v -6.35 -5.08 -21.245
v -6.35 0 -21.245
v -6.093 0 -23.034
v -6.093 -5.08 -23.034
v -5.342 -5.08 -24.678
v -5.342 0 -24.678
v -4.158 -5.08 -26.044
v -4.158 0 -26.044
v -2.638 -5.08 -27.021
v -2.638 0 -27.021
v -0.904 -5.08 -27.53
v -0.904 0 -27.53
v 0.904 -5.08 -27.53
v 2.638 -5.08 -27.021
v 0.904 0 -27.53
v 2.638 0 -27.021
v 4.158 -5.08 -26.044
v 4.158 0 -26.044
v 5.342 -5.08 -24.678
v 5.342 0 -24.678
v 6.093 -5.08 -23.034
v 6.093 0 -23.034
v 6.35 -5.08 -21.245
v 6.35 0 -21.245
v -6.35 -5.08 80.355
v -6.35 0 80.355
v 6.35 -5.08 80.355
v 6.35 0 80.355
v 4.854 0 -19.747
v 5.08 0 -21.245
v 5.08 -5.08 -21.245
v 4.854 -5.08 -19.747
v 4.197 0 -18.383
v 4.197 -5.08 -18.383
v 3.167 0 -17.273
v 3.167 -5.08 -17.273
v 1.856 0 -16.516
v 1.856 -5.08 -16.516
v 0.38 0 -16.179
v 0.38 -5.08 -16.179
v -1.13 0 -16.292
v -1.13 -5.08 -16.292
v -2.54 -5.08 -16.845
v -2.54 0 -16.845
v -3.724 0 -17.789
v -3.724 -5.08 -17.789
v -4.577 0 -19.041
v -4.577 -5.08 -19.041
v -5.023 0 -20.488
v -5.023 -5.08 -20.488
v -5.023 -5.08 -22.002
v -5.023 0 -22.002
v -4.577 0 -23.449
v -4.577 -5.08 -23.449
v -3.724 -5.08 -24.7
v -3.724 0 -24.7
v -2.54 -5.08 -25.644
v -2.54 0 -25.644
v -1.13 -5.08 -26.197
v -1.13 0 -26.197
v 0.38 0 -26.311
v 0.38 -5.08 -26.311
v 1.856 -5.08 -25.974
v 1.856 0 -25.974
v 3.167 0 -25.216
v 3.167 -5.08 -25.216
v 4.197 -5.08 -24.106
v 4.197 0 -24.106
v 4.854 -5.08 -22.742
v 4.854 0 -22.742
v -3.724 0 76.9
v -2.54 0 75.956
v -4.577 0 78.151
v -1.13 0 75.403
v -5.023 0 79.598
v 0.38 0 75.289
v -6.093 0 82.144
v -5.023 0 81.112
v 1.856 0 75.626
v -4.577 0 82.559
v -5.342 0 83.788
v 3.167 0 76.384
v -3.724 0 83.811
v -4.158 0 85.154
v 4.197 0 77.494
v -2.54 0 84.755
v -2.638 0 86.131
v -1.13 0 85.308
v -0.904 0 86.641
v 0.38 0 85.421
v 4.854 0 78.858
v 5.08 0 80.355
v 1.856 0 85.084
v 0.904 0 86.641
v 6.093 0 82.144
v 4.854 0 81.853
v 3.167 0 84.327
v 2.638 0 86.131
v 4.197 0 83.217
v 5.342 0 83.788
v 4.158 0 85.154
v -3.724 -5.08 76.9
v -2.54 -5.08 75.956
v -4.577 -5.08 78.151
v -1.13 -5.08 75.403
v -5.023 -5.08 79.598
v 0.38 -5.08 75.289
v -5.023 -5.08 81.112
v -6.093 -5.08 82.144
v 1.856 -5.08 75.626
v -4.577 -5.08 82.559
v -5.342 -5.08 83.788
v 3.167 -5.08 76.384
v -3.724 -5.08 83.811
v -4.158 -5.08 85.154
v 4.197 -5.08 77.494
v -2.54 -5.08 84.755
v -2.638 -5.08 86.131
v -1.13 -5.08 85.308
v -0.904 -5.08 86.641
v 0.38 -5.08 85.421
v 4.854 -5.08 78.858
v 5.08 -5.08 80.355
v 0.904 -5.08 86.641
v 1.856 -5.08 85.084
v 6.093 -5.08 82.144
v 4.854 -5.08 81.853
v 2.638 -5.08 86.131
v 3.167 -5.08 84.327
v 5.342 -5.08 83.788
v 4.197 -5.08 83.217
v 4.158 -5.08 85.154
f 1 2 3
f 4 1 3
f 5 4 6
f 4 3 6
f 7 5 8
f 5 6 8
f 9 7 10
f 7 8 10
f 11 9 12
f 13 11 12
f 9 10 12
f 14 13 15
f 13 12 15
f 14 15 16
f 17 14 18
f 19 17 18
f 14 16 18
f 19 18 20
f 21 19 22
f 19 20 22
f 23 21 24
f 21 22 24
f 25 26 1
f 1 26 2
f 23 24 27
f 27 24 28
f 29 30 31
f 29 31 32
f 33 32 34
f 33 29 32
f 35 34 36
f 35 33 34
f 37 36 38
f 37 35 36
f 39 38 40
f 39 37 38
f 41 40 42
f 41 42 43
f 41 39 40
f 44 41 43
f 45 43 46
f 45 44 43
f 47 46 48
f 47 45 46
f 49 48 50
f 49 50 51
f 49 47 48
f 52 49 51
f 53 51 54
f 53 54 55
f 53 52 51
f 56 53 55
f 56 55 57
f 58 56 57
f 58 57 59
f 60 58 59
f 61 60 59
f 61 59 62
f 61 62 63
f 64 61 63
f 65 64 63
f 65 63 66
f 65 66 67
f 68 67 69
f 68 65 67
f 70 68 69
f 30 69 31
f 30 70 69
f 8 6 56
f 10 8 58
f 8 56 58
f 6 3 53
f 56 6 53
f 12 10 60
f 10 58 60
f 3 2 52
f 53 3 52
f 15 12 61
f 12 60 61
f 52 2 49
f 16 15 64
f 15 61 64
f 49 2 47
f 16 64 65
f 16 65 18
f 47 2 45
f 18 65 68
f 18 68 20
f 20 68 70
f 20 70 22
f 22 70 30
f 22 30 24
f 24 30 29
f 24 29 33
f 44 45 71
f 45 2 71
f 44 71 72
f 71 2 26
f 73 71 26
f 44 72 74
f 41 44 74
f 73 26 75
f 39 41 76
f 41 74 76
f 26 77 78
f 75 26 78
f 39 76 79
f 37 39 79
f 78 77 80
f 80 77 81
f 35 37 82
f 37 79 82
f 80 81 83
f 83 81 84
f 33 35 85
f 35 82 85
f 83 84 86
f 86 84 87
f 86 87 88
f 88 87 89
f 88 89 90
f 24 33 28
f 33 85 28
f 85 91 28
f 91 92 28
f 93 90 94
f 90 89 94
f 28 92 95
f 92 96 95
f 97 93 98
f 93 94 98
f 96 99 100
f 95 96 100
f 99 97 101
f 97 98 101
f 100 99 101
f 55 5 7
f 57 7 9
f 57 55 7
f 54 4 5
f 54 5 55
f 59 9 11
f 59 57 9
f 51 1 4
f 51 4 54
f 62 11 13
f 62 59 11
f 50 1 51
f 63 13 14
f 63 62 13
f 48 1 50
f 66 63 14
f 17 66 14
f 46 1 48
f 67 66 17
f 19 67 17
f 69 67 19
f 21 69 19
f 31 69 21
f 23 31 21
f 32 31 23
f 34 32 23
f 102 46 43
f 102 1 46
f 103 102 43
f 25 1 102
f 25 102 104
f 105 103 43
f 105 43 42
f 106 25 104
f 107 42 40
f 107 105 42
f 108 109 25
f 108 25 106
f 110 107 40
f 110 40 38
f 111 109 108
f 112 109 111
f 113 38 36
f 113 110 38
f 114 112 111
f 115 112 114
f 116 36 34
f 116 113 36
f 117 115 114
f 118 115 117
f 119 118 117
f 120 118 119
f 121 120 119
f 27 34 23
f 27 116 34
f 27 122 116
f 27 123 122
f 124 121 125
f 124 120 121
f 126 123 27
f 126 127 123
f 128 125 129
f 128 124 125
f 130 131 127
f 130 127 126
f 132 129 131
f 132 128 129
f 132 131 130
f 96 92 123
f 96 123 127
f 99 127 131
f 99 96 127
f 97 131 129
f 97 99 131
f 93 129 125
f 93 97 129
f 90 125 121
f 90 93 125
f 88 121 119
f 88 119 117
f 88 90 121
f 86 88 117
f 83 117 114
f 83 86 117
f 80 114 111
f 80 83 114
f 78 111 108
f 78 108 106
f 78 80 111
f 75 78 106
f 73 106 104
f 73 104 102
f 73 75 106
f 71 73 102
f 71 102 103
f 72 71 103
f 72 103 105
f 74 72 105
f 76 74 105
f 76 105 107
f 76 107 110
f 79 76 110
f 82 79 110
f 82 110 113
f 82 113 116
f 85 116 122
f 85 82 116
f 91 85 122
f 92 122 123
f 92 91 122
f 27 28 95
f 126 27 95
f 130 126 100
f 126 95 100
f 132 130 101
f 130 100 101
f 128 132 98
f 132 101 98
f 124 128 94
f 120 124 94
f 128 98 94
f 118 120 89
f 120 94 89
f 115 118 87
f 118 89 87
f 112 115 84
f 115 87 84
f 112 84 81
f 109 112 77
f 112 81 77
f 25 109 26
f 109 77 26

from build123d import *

# Parameters (mm, degrees)
F0_R     = 5.08
F1_DEPTH = 5.08


with BuildPart() as f1:
    # F0 (on Front) → F1 (new body)
    with BuildSketch(Plane.XZ):
        with BuildLine():
            Line((6.35, -21.244763), (6.35, 80.355237))
            ThreePointArc((6.35, 80.355237), (0, 74.005237), (-6.35, 80.355237))
            Line((-6.35, 80.355237), (-6.35, -21.244763))
            ThreePointArc((-6.35, -21.244763), (0, -14.894763), (6.35, -21.244763))
        make_face()
        with BuildLine():
            ThreePointArc((-6.35, 80.355237), (0, 74.005237), (6.35, 80.355237))
            ThreePointArc((6.35, 80.355237), (0, 86.705237), (-6.35, 80.355237))
        make_face()
        with Locations((0, 80.355237)):
            Circle(F0_R, mode=Mode.SUBTRACT)
        with BuildLine():
            ThreePointArc((-6.35, -21.244763), (0, -27.594763), (6.35, -21.244763))
            ThreePointArc((6.35, -21.244763), (0, -14.894763), (-6.35, -21.244763))
        make_face()
        with Locations((0, -21.244763)):
            Circle(F0_R, mode=Mode.SUBTRACT)
    extrude(amount=F1_DEPTH)


solid = f1.part
